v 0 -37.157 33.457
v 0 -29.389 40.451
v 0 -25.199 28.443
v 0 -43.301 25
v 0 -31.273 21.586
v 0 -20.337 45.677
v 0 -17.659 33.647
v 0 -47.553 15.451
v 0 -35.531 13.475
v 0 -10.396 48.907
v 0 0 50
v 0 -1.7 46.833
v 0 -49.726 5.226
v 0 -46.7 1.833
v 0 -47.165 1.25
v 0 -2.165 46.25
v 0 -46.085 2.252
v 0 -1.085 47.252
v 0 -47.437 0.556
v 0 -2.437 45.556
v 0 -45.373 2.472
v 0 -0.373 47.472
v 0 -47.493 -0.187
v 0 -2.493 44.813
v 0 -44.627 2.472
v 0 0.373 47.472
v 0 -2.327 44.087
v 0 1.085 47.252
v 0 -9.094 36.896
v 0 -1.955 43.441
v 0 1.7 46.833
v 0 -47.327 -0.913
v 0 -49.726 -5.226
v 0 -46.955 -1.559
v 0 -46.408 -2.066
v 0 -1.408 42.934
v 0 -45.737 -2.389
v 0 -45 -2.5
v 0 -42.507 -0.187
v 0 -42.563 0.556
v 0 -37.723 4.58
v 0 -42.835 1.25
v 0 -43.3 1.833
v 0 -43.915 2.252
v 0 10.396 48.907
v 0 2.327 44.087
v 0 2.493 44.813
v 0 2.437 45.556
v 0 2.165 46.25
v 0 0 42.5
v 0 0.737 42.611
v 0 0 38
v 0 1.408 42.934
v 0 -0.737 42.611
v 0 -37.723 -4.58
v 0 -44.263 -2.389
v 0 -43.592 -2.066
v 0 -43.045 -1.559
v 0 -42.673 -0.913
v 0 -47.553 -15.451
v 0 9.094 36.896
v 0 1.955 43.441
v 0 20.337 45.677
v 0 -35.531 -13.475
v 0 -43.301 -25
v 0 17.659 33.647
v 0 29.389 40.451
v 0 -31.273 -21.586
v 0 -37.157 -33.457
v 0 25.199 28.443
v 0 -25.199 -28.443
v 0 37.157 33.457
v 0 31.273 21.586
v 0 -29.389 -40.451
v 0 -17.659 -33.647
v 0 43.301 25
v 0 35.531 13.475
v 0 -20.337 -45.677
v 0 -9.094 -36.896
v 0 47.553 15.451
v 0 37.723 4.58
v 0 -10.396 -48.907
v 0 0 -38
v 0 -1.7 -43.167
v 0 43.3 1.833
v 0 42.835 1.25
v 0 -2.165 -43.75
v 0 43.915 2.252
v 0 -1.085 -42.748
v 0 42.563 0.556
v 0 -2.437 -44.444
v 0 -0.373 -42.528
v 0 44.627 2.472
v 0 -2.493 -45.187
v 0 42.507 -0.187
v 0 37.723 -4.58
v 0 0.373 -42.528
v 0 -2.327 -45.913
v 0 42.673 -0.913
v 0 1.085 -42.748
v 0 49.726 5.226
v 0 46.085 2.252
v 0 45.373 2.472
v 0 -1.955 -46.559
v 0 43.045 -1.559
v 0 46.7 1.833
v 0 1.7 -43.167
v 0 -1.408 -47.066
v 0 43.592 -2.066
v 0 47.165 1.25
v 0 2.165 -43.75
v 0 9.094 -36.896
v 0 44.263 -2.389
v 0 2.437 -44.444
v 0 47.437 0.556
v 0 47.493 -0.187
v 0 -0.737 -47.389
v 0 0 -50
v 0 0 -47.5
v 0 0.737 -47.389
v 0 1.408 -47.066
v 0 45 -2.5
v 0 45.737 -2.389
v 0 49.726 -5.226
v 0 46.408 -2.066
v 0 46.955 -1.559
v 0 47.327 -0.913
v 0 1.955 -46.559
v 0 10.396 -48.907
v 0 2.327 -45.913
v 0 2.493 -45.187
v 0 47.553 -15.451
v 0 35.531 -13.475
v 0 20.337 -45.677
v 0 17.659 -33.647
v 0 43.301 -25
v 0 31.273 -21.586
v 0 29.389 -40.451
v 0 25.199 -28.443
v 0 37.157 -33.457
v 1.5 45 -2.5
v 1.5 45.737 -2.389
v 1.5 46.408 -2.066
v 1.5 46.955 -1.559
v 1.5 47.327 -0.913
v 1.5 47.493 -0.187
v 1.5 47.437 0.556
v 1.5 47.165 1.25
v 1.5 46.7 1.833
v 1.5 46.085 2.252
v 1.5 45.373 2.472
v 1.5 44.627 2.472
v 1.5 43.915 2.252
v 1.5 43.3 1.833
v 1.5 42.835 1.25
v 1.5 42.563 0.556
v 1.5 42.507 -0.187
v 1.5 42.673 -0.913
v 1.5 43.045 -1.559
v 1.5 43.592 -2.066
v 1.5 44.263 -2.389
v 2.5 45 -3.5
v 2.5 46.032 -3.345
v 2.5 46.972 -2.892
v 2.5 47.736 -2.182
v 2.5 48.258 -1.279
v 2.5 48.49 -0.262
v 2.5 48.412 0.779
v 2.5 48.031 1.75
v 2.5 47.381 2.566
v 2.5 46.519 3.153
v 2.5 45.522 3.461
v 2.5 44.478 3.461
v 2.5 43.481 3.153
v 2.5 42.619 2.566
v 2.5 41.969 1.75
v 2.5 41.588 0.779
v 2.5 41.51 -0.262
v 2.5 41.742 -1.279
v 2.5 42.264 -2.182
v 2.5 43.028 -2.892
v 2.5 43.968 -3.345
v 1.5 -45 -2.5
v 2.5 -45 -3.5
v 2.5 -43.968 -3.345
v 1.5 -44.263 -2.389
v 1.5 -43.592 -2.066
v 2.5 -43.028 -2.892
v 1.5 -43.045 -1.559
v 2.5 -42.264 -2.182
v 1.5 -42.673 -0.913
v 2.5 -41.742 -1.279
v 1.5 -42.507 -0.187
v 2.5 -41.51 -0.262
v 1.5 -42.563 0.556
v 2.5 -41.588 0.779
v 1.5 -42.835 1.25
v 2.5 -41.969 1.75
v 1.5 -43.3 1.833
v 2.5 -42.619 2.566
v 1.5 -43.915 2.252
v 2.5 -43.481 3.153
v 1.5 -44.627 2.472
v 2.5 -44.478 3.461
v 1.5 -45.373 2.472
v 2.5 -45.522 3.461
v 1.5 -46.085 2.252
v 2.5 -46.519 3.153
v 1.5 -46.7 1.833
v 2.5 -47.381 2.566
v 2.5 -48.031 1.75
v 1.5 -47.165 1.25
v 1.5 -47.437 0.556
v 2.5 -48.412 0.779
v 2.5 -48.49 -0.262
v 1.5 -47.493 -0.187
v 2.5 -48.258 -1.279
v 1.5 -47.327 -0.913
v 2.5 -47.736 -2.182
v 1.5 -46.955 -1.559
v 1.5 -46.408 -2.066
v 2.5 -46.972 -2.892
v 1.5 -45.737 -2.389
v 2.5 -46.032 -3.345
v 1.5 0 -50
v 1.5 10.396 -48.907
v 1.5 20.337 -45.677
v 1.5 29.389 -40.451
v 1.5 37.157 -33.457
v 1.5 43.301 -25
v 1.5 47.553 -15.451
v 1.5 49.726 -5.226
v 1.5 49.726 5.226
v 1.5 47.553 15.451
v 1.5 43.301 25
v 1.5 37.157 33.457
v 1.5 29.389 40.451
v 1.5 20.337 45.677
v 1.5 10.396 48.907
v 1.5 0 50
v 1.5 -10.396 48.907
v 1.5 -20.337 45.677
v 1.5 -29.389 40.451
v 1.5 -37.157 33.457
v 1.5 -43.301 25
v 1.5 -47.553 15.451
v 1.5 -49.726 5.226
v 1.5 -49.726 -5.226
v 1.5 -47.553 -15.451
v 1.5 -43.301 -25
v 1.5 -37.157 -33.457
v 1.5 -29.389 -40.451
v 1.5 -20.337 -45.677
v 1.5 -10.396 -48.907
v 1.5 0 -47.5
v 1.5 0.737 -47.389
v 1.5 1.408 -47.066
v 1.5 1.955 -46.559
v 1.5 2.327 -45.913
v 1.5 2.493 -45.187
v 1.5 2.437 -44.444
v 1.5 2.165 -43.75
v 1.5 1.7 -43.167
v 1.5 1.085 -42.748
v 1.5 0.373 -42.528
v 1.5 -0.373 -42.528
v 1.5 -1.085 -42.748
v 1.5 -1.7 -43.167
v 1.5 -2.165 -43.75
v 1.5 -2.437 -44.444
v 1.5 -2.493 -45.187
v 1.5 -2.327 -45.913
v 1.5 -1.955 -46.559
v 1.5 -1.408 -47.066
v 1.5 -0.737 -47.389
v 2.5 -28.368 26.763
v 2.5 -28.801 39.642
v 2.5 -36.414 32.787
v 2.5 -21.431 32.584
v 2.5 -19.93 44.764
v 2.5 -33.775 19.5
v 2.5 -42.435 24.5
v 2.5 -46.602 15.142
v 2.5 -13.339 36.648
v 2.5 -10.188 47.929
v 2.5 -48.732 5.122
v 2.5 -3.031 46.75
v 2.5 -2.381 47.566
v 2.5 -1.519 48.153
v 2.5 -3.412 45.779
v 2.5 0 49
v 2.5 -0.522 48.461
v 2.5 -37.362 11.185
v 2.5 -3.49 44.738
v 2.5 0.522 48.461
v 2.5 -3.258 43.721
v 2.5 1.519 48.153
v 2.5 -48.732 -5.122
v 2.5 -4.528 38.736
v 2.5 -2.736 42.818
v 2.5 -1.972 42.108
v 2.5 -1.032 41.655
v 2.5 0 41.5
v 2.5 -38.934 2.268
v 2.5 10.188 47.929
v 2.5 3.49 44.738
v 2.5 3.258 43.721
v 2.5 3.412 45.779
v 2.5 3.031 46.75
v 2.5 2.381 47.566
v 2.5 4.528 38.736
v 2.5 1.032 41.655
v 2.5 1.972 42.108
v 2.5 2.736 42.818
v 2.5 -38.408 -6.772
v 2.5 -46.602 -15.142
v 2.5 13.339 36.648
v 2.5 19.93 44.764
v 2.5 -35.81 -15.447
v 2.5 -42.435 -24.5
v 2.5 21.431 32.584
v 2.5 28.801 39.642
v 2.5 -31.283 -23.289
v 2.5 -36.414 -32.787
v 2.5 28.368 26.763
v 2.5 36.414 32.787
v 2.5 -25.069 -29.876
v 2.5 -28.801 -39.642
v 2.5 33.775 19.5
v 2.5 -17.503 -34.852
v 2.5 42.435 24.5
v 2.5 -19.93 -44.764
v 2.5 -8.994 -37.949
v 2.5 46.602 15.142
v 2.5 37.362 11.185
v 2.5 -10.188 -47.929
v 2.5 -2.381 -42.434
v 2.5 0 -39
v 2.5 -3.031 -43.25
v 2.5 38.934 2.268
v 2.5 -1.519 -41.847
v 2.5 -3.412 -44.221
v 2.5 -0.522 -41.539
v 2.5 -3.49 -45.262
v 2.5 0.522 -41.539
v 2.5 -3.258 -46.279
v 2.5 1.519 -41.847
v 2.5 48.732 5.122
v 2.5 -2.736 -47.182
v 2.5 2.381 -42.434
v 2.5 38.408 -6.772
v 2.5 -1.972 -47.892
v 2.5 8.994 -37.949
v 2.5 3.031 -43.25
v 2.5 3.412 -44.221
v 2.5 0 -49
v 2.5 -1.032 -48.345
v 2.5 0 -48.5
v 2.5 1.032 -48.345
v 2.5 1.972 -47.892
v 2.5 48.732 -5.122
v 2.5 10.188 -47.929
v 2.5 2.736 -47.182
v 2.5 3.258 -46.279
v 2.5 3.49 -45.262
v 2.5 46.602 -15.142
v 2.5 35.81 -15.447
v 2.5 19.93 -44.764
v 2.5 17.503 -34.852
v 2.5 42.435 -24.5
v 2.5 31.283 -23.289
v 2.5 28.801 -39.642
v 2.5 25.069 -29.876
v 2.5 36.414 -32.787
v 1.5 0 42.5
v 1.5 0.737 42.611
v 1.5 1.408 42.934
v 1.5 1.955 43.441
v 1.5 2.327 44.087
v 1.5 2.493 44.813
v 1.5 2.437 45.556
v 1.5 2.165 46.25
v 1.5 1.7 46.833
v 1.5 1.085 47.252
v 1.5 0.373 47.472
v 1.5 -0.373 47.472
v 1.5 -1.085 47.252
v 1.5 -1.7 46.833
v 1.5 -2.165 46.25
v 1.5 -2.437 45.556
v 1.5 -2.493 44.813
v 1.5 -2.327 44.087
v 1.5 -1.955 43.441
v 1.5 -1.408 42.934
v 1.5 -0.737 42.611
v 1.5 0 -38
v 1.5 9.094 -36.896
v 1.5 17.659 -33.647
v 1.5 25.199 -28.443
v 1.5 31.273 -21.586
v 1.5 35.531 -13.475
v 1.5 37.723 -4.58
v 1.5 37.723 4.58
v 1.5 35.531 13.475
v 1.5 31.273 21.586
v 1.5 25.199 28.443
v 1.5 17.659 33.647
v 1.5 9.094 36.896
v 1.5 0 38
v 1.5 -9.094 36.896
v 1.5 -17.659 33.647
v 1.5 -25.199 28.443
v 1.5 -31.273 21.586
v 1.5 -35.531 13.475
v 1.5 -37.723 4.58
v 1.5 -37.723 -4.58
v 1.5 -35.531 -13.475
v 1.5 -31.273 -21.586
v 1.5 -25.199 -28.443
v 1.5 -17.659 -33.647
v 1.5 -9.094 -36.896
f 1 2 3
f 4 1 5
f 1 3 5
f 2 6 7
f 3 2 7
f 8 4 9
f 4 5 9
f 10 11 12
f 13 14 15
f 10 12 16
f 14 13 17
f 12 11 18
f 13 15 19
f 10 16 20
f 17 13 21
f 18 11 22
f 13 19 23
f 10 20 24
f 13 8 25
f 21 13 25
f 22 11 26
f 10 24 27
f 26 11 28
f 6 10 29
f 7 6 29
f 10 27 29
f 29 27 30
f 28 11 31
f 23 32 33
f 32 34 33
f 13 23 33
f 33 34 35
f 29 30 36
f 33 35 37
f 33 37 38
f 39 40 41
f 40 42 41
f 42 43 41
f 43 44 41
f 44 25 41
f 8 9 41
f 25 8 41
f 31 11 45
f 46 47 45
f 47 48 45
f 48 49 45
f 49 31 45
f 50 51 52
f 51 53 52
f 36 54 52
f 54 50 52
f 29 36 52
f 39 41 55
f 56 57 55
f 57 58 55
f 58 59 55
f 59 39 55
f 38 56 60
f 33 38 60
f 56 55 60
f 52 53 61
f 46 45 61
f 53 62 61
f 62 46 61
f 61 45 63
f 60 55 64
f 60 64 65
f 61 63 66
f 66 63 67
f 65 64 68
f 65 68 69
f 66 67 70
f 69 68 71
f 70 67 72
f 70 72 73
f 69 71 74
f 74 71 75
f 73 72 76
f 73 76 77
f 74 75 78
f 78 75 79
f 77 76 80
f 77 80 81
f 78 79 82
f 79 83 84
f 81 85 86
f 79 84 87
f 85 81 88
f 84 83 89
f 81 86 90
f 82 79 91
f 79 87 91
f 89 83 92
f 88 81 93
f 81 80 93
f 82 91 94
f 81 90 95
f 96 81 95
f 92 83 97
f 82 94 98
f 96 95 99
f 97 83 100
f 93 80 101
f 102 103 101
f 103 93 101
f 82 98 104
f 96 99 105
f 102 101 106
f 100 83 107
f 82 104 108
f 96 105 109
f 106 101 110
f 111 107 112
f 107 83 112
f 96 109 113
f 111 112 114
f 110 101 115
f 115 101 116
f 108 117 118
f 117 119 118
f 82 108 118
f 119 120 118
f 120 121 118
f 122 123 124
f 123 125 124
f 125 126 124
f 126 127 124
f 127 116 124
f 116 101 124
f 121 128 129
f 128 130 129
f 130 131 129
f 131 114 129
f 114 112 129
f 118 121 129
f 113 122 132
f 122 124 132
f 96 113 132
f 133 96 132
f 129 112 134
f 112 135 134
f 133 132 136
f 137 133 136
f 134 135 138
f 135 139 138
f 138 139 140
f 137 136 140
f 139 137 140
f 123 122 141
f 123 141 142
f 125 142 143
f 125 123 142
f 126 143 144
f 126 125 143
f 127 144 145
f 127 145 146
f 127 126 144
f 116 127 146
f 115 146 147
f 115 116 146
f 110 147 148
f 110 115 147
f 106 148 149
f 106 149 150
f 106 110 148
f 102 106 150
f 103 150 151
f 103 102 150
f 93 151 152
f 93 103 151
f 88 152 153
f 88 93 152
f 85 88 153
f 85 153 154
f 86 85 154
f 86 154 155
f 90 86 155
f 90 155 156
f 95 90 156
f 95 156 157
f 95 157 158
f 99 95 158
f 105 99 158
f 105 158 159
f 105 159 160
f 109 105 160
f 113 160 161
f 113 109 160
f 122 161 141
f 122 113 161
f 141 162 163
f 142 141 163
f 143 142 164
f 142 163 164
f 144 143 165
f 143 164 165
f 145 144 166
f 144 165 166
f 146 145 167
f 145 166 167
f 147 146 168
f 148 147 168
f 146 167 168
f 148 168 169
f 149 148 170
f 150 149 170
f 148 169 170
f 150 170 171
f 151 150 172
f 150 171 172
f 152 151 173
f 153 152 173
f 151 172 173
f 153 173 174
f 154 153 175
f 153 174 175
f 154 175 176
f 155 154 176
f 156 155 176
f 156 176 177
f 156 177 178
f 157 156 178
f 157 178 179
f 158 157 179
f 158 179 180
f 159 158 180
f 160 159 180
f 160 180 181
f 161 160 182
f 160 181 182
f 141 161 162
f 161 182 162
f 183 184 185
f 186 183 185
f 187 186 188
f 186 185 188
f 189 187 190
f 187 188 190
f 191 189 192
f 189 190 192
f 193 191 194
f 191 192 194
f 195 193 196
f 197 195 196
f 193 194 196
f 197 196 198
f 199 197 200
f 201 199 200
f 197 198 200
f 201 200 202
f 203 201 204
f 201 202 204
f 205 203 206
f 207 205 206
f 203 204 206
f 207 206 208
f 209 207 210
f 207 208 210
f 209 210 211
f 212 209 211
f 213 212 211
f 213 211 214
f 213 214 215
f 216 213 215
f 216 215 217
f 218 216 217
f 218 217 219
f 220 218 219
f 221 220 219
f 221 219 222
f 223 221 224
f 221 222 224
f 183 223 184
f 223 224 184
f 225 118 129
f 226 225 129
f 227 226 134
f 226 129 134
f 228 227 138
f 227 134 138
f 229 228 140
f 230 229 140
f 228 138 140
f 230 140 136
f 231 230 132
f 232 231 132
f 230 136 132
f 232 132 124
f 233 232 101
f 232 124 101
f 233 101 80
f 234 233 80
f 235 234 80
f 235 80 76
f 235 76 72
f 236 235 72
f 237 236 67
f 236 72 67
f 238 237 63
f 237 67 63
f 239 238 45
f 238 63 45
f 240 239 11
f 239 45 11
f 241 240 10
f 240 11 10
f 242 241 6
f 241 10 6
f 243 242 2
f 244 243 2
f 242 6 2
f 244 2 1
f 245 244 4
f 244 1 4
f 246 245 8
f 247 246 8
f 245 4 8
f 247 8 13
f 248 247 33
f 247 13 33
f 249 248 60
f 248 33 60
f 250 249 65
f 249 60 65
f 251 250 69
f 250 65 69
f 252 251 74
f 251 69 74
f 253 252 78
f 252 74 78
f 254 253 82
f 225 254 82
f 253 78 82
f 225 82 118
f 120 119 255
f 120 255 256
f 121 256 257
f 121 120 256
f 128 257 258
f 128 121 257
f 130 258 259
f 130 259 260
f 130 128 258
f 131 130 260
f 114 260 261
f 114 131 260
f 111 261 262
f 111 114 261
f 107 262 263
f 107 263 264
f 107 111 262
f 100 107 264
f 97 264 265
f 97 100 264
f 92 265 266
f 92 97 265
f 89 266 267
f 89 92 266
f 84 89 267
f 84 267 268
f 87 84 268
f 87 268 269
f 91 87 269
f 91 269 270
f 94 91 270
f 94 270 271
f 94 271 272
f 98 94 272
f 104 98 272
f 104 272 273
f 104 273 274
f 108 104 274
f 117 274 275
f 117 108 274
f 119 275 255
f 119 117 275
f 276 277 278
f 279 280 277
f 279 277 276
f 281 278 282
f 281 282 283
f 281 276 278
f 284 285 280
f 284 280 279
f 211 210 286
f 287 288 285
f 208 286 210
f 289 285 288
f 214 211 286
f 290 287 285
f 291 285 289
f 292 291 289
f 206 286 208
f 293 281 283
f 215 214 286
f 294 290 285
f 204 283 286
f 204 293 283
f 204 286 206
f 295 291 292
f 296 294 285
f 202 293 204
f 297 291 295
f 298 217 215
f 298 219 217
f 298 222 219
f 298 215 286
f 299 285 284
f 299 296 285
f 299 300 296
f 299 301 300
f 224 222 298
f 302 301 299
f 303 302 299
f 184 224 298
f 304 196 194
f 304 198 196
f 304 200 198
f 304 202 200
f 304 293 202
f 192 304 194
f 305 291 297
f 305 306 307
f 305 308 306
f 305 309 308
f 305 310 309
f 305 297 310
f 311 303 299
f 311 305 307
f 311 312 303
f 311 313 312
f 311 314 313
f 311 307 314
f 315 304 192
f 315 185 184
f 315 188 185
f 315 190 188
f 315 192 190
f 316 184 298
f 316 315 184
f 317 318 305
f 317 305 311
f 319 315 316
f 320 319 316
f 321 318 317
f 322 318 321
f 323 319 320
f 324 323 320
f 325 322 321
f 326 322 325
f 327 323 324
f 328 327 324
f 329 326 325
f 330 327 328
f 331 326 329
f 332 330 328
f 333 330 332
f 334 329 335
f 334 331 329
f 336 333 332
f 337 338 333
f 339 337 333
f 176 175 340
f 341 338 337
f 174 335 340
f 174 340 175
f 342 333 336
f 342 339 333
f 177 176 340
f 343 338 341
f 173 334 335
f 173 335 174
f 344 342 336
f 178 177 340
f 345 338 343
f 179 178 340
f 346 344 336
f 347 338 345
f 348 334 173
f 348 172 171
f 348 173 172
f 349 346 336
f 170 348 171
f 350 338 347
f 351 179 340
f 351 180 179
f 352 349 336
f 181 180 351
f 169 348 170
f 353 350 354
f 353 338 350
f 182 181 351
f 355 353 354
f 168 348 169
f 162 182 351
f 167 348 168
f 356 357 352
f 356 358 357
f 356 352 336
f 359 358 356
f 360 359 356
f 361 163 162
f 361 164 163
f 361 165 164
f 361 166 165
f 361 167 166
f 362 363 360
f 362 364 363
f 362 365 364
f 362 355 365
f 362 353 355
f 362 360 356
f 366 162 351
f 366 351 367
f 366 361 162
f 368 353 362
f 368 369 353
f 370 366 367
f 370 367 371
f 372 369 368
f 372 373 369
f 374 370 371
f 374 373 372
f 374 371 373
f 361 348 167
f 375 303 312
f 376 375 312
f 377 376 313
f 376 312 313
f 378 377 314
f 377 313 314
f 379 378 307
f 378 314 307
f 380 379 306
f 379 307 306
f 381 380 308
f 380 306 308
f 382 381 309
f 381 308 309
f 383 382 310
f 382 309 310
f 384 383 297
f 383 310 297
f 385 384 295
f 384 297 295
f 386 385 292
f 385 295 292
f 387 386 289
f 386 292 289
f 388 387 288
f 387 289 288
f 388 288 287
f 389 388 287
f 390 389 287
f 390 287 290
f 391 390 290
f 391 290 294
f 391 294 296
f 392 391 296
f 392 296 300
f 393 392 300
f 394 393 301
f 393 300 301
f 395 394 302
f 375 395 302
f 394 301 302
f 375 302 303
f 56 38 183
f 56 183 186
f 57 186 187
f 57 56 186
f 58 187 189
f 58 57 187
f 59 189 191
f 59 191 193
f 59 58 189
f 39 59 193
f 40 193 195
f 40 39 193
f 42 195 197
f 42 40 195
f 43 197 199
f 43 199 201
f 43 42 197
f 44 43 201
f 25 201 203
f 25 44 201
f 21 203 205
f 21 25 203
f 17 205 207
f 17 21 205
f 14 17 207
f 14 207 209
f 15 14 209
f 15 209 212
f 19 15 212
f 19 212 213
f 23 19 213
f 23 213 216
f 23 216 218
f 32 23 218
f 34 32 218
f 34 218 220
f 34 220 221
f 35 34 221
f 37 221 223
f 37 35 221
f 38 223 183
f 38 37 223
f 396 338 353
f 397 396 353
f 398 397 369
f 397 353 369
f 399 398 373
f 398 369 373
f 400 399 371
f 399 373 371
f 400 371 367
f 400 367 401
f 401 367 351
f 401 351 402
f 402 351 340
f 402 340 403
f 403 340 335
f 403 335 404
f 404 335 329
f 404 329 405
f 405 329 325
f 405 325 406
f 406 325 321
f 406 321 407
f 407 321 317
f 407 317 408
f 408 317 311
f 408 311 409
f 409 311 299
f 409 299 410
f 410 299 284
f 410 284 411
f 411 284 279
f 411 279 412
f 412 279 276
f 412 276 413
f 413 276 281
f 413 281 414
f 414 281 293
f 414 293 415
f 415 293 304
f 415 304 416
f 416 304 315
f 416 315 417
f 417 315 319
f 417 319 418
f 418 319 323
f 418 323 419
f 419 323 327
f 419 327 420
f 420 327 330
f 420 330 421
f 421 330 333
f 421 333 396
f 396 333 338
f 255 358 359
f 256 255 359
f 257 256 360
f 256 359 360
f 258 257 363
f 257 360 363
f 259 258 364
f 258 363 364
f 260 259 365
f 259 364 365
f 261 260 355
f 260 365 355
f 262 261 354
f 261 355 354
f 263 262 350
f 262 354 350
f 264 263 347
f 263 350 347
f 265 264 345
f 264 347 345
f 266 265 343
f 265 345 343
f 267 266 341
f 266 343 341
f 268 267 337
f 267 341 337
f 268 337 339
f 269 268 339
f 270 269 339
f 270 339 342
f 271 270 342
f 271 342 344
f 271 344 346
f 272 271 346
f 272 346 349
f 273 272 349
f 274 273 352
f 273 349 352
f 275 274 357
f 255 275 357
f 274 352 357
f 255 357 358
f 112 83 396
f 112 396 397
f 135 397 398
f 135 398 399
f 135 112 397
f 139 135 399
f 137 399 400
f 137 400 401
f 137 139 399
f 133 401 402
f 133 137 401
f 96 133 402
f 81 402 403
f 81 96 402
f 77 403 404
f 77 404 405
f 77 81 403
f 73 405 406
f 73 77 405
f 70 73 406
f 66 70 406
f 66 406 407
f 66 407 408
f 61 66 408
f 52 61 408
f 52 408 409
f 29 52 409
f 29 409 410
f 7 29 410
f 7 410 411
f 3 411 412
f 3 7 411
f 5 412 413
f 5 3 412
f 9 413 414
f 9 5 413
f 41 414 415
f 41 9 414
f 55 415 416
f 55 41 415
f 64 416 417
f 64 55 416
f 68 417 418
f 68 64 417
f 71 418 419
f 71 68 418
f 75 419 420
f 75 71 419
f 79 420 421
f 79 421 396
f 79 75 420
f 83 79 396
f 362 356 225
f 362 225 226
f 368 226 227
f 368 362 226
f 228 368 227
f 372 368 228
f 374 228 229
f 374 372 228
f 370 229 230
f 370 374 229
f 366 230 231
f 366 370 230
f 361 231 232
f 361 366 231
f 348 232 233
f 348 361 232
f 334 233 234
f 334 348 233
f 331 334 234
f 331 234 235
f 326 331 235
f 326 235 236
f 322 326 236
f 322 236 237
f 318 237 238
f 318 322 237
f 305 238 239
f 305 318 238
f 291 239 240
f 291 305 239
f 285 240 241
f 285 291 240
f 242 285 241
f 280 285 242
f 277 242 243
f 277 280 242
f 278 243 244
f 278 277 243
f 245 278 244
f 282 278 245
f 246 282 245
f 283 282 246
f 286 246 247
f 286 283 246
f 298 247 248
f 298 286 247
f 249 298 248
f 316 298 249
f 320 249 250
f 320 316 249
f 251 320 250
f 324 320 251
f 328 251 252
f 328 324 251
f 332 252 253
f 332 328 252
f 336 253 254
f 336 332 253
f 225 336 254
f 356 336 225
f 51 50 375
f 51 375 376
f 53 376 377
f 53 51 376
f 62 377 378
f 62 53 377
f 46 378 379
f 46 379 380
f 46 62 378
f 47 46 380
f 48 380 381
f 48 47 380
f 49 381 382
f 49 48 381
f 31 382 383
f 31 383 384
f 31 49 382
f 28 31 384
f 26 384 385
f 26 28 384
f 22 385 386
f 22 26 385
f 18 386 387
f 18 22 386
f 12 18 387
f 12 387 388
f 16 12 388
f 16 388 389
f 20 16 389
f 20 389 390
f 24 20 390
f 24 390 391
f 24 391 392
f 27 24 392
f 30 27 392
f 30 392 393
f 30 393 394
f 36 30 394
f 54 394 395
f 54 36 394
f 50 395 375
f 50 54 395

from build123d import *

# Parameters (mm, degrees)
SKETCH1_R           = 50
SKETCH1_R_2         = 38
SKETCH1_R_3         = 2.5
BOSS_EXTRUDE1_DEPTH = 2.5
CHAMFER1_SIZE       = 1


with BuildPart() as part:
    # Sketch1 → Boss-Extrude1 (new body)
    with BuildSketch(Plane(origin=(0, 0, 0), x_dir=(0, 0, -1), z_dir=(1, 0, 0))):
        Circle(SKETCH1_R)
        Circle(SKETCH1_R_2, mode=Mode.SUBTRACT)
        with Locations((0, 45)):
            Circle(SKETCH1_R_3, mode=Mode.SUBTRACT)
        with Locations((45, 0)):
            Circle(SKETCH1_R_3, mode=Mode.SUBTRACT)
        with Locations((0, -45)):
            Circle(SKETCH1_R_3, mode=Mode.SUBTRACT)
        with Locations((-45, 0)):
            Circle(SKETCH1_R_3, mode=Mode.SUBTRACT)
    extrude(amount=BOSS_EXTRUDE1_DEPTH)

    # Chamfer1
    chamfer1_edges = [part.edges().sort_by_distance(p)[0] for p in [
        (2.5, 0, -42.5),
        (2.5, -45, 2.5),
        (2.5, 0, 47.5),
        (2.5, 0, 50),
        (2.5, 0, 38),
        (2.5, 45, 2.5),
    ]]
    chamfer(chamfer1_edges, length=CHAMFER1_SIZE)


solid = part.part
